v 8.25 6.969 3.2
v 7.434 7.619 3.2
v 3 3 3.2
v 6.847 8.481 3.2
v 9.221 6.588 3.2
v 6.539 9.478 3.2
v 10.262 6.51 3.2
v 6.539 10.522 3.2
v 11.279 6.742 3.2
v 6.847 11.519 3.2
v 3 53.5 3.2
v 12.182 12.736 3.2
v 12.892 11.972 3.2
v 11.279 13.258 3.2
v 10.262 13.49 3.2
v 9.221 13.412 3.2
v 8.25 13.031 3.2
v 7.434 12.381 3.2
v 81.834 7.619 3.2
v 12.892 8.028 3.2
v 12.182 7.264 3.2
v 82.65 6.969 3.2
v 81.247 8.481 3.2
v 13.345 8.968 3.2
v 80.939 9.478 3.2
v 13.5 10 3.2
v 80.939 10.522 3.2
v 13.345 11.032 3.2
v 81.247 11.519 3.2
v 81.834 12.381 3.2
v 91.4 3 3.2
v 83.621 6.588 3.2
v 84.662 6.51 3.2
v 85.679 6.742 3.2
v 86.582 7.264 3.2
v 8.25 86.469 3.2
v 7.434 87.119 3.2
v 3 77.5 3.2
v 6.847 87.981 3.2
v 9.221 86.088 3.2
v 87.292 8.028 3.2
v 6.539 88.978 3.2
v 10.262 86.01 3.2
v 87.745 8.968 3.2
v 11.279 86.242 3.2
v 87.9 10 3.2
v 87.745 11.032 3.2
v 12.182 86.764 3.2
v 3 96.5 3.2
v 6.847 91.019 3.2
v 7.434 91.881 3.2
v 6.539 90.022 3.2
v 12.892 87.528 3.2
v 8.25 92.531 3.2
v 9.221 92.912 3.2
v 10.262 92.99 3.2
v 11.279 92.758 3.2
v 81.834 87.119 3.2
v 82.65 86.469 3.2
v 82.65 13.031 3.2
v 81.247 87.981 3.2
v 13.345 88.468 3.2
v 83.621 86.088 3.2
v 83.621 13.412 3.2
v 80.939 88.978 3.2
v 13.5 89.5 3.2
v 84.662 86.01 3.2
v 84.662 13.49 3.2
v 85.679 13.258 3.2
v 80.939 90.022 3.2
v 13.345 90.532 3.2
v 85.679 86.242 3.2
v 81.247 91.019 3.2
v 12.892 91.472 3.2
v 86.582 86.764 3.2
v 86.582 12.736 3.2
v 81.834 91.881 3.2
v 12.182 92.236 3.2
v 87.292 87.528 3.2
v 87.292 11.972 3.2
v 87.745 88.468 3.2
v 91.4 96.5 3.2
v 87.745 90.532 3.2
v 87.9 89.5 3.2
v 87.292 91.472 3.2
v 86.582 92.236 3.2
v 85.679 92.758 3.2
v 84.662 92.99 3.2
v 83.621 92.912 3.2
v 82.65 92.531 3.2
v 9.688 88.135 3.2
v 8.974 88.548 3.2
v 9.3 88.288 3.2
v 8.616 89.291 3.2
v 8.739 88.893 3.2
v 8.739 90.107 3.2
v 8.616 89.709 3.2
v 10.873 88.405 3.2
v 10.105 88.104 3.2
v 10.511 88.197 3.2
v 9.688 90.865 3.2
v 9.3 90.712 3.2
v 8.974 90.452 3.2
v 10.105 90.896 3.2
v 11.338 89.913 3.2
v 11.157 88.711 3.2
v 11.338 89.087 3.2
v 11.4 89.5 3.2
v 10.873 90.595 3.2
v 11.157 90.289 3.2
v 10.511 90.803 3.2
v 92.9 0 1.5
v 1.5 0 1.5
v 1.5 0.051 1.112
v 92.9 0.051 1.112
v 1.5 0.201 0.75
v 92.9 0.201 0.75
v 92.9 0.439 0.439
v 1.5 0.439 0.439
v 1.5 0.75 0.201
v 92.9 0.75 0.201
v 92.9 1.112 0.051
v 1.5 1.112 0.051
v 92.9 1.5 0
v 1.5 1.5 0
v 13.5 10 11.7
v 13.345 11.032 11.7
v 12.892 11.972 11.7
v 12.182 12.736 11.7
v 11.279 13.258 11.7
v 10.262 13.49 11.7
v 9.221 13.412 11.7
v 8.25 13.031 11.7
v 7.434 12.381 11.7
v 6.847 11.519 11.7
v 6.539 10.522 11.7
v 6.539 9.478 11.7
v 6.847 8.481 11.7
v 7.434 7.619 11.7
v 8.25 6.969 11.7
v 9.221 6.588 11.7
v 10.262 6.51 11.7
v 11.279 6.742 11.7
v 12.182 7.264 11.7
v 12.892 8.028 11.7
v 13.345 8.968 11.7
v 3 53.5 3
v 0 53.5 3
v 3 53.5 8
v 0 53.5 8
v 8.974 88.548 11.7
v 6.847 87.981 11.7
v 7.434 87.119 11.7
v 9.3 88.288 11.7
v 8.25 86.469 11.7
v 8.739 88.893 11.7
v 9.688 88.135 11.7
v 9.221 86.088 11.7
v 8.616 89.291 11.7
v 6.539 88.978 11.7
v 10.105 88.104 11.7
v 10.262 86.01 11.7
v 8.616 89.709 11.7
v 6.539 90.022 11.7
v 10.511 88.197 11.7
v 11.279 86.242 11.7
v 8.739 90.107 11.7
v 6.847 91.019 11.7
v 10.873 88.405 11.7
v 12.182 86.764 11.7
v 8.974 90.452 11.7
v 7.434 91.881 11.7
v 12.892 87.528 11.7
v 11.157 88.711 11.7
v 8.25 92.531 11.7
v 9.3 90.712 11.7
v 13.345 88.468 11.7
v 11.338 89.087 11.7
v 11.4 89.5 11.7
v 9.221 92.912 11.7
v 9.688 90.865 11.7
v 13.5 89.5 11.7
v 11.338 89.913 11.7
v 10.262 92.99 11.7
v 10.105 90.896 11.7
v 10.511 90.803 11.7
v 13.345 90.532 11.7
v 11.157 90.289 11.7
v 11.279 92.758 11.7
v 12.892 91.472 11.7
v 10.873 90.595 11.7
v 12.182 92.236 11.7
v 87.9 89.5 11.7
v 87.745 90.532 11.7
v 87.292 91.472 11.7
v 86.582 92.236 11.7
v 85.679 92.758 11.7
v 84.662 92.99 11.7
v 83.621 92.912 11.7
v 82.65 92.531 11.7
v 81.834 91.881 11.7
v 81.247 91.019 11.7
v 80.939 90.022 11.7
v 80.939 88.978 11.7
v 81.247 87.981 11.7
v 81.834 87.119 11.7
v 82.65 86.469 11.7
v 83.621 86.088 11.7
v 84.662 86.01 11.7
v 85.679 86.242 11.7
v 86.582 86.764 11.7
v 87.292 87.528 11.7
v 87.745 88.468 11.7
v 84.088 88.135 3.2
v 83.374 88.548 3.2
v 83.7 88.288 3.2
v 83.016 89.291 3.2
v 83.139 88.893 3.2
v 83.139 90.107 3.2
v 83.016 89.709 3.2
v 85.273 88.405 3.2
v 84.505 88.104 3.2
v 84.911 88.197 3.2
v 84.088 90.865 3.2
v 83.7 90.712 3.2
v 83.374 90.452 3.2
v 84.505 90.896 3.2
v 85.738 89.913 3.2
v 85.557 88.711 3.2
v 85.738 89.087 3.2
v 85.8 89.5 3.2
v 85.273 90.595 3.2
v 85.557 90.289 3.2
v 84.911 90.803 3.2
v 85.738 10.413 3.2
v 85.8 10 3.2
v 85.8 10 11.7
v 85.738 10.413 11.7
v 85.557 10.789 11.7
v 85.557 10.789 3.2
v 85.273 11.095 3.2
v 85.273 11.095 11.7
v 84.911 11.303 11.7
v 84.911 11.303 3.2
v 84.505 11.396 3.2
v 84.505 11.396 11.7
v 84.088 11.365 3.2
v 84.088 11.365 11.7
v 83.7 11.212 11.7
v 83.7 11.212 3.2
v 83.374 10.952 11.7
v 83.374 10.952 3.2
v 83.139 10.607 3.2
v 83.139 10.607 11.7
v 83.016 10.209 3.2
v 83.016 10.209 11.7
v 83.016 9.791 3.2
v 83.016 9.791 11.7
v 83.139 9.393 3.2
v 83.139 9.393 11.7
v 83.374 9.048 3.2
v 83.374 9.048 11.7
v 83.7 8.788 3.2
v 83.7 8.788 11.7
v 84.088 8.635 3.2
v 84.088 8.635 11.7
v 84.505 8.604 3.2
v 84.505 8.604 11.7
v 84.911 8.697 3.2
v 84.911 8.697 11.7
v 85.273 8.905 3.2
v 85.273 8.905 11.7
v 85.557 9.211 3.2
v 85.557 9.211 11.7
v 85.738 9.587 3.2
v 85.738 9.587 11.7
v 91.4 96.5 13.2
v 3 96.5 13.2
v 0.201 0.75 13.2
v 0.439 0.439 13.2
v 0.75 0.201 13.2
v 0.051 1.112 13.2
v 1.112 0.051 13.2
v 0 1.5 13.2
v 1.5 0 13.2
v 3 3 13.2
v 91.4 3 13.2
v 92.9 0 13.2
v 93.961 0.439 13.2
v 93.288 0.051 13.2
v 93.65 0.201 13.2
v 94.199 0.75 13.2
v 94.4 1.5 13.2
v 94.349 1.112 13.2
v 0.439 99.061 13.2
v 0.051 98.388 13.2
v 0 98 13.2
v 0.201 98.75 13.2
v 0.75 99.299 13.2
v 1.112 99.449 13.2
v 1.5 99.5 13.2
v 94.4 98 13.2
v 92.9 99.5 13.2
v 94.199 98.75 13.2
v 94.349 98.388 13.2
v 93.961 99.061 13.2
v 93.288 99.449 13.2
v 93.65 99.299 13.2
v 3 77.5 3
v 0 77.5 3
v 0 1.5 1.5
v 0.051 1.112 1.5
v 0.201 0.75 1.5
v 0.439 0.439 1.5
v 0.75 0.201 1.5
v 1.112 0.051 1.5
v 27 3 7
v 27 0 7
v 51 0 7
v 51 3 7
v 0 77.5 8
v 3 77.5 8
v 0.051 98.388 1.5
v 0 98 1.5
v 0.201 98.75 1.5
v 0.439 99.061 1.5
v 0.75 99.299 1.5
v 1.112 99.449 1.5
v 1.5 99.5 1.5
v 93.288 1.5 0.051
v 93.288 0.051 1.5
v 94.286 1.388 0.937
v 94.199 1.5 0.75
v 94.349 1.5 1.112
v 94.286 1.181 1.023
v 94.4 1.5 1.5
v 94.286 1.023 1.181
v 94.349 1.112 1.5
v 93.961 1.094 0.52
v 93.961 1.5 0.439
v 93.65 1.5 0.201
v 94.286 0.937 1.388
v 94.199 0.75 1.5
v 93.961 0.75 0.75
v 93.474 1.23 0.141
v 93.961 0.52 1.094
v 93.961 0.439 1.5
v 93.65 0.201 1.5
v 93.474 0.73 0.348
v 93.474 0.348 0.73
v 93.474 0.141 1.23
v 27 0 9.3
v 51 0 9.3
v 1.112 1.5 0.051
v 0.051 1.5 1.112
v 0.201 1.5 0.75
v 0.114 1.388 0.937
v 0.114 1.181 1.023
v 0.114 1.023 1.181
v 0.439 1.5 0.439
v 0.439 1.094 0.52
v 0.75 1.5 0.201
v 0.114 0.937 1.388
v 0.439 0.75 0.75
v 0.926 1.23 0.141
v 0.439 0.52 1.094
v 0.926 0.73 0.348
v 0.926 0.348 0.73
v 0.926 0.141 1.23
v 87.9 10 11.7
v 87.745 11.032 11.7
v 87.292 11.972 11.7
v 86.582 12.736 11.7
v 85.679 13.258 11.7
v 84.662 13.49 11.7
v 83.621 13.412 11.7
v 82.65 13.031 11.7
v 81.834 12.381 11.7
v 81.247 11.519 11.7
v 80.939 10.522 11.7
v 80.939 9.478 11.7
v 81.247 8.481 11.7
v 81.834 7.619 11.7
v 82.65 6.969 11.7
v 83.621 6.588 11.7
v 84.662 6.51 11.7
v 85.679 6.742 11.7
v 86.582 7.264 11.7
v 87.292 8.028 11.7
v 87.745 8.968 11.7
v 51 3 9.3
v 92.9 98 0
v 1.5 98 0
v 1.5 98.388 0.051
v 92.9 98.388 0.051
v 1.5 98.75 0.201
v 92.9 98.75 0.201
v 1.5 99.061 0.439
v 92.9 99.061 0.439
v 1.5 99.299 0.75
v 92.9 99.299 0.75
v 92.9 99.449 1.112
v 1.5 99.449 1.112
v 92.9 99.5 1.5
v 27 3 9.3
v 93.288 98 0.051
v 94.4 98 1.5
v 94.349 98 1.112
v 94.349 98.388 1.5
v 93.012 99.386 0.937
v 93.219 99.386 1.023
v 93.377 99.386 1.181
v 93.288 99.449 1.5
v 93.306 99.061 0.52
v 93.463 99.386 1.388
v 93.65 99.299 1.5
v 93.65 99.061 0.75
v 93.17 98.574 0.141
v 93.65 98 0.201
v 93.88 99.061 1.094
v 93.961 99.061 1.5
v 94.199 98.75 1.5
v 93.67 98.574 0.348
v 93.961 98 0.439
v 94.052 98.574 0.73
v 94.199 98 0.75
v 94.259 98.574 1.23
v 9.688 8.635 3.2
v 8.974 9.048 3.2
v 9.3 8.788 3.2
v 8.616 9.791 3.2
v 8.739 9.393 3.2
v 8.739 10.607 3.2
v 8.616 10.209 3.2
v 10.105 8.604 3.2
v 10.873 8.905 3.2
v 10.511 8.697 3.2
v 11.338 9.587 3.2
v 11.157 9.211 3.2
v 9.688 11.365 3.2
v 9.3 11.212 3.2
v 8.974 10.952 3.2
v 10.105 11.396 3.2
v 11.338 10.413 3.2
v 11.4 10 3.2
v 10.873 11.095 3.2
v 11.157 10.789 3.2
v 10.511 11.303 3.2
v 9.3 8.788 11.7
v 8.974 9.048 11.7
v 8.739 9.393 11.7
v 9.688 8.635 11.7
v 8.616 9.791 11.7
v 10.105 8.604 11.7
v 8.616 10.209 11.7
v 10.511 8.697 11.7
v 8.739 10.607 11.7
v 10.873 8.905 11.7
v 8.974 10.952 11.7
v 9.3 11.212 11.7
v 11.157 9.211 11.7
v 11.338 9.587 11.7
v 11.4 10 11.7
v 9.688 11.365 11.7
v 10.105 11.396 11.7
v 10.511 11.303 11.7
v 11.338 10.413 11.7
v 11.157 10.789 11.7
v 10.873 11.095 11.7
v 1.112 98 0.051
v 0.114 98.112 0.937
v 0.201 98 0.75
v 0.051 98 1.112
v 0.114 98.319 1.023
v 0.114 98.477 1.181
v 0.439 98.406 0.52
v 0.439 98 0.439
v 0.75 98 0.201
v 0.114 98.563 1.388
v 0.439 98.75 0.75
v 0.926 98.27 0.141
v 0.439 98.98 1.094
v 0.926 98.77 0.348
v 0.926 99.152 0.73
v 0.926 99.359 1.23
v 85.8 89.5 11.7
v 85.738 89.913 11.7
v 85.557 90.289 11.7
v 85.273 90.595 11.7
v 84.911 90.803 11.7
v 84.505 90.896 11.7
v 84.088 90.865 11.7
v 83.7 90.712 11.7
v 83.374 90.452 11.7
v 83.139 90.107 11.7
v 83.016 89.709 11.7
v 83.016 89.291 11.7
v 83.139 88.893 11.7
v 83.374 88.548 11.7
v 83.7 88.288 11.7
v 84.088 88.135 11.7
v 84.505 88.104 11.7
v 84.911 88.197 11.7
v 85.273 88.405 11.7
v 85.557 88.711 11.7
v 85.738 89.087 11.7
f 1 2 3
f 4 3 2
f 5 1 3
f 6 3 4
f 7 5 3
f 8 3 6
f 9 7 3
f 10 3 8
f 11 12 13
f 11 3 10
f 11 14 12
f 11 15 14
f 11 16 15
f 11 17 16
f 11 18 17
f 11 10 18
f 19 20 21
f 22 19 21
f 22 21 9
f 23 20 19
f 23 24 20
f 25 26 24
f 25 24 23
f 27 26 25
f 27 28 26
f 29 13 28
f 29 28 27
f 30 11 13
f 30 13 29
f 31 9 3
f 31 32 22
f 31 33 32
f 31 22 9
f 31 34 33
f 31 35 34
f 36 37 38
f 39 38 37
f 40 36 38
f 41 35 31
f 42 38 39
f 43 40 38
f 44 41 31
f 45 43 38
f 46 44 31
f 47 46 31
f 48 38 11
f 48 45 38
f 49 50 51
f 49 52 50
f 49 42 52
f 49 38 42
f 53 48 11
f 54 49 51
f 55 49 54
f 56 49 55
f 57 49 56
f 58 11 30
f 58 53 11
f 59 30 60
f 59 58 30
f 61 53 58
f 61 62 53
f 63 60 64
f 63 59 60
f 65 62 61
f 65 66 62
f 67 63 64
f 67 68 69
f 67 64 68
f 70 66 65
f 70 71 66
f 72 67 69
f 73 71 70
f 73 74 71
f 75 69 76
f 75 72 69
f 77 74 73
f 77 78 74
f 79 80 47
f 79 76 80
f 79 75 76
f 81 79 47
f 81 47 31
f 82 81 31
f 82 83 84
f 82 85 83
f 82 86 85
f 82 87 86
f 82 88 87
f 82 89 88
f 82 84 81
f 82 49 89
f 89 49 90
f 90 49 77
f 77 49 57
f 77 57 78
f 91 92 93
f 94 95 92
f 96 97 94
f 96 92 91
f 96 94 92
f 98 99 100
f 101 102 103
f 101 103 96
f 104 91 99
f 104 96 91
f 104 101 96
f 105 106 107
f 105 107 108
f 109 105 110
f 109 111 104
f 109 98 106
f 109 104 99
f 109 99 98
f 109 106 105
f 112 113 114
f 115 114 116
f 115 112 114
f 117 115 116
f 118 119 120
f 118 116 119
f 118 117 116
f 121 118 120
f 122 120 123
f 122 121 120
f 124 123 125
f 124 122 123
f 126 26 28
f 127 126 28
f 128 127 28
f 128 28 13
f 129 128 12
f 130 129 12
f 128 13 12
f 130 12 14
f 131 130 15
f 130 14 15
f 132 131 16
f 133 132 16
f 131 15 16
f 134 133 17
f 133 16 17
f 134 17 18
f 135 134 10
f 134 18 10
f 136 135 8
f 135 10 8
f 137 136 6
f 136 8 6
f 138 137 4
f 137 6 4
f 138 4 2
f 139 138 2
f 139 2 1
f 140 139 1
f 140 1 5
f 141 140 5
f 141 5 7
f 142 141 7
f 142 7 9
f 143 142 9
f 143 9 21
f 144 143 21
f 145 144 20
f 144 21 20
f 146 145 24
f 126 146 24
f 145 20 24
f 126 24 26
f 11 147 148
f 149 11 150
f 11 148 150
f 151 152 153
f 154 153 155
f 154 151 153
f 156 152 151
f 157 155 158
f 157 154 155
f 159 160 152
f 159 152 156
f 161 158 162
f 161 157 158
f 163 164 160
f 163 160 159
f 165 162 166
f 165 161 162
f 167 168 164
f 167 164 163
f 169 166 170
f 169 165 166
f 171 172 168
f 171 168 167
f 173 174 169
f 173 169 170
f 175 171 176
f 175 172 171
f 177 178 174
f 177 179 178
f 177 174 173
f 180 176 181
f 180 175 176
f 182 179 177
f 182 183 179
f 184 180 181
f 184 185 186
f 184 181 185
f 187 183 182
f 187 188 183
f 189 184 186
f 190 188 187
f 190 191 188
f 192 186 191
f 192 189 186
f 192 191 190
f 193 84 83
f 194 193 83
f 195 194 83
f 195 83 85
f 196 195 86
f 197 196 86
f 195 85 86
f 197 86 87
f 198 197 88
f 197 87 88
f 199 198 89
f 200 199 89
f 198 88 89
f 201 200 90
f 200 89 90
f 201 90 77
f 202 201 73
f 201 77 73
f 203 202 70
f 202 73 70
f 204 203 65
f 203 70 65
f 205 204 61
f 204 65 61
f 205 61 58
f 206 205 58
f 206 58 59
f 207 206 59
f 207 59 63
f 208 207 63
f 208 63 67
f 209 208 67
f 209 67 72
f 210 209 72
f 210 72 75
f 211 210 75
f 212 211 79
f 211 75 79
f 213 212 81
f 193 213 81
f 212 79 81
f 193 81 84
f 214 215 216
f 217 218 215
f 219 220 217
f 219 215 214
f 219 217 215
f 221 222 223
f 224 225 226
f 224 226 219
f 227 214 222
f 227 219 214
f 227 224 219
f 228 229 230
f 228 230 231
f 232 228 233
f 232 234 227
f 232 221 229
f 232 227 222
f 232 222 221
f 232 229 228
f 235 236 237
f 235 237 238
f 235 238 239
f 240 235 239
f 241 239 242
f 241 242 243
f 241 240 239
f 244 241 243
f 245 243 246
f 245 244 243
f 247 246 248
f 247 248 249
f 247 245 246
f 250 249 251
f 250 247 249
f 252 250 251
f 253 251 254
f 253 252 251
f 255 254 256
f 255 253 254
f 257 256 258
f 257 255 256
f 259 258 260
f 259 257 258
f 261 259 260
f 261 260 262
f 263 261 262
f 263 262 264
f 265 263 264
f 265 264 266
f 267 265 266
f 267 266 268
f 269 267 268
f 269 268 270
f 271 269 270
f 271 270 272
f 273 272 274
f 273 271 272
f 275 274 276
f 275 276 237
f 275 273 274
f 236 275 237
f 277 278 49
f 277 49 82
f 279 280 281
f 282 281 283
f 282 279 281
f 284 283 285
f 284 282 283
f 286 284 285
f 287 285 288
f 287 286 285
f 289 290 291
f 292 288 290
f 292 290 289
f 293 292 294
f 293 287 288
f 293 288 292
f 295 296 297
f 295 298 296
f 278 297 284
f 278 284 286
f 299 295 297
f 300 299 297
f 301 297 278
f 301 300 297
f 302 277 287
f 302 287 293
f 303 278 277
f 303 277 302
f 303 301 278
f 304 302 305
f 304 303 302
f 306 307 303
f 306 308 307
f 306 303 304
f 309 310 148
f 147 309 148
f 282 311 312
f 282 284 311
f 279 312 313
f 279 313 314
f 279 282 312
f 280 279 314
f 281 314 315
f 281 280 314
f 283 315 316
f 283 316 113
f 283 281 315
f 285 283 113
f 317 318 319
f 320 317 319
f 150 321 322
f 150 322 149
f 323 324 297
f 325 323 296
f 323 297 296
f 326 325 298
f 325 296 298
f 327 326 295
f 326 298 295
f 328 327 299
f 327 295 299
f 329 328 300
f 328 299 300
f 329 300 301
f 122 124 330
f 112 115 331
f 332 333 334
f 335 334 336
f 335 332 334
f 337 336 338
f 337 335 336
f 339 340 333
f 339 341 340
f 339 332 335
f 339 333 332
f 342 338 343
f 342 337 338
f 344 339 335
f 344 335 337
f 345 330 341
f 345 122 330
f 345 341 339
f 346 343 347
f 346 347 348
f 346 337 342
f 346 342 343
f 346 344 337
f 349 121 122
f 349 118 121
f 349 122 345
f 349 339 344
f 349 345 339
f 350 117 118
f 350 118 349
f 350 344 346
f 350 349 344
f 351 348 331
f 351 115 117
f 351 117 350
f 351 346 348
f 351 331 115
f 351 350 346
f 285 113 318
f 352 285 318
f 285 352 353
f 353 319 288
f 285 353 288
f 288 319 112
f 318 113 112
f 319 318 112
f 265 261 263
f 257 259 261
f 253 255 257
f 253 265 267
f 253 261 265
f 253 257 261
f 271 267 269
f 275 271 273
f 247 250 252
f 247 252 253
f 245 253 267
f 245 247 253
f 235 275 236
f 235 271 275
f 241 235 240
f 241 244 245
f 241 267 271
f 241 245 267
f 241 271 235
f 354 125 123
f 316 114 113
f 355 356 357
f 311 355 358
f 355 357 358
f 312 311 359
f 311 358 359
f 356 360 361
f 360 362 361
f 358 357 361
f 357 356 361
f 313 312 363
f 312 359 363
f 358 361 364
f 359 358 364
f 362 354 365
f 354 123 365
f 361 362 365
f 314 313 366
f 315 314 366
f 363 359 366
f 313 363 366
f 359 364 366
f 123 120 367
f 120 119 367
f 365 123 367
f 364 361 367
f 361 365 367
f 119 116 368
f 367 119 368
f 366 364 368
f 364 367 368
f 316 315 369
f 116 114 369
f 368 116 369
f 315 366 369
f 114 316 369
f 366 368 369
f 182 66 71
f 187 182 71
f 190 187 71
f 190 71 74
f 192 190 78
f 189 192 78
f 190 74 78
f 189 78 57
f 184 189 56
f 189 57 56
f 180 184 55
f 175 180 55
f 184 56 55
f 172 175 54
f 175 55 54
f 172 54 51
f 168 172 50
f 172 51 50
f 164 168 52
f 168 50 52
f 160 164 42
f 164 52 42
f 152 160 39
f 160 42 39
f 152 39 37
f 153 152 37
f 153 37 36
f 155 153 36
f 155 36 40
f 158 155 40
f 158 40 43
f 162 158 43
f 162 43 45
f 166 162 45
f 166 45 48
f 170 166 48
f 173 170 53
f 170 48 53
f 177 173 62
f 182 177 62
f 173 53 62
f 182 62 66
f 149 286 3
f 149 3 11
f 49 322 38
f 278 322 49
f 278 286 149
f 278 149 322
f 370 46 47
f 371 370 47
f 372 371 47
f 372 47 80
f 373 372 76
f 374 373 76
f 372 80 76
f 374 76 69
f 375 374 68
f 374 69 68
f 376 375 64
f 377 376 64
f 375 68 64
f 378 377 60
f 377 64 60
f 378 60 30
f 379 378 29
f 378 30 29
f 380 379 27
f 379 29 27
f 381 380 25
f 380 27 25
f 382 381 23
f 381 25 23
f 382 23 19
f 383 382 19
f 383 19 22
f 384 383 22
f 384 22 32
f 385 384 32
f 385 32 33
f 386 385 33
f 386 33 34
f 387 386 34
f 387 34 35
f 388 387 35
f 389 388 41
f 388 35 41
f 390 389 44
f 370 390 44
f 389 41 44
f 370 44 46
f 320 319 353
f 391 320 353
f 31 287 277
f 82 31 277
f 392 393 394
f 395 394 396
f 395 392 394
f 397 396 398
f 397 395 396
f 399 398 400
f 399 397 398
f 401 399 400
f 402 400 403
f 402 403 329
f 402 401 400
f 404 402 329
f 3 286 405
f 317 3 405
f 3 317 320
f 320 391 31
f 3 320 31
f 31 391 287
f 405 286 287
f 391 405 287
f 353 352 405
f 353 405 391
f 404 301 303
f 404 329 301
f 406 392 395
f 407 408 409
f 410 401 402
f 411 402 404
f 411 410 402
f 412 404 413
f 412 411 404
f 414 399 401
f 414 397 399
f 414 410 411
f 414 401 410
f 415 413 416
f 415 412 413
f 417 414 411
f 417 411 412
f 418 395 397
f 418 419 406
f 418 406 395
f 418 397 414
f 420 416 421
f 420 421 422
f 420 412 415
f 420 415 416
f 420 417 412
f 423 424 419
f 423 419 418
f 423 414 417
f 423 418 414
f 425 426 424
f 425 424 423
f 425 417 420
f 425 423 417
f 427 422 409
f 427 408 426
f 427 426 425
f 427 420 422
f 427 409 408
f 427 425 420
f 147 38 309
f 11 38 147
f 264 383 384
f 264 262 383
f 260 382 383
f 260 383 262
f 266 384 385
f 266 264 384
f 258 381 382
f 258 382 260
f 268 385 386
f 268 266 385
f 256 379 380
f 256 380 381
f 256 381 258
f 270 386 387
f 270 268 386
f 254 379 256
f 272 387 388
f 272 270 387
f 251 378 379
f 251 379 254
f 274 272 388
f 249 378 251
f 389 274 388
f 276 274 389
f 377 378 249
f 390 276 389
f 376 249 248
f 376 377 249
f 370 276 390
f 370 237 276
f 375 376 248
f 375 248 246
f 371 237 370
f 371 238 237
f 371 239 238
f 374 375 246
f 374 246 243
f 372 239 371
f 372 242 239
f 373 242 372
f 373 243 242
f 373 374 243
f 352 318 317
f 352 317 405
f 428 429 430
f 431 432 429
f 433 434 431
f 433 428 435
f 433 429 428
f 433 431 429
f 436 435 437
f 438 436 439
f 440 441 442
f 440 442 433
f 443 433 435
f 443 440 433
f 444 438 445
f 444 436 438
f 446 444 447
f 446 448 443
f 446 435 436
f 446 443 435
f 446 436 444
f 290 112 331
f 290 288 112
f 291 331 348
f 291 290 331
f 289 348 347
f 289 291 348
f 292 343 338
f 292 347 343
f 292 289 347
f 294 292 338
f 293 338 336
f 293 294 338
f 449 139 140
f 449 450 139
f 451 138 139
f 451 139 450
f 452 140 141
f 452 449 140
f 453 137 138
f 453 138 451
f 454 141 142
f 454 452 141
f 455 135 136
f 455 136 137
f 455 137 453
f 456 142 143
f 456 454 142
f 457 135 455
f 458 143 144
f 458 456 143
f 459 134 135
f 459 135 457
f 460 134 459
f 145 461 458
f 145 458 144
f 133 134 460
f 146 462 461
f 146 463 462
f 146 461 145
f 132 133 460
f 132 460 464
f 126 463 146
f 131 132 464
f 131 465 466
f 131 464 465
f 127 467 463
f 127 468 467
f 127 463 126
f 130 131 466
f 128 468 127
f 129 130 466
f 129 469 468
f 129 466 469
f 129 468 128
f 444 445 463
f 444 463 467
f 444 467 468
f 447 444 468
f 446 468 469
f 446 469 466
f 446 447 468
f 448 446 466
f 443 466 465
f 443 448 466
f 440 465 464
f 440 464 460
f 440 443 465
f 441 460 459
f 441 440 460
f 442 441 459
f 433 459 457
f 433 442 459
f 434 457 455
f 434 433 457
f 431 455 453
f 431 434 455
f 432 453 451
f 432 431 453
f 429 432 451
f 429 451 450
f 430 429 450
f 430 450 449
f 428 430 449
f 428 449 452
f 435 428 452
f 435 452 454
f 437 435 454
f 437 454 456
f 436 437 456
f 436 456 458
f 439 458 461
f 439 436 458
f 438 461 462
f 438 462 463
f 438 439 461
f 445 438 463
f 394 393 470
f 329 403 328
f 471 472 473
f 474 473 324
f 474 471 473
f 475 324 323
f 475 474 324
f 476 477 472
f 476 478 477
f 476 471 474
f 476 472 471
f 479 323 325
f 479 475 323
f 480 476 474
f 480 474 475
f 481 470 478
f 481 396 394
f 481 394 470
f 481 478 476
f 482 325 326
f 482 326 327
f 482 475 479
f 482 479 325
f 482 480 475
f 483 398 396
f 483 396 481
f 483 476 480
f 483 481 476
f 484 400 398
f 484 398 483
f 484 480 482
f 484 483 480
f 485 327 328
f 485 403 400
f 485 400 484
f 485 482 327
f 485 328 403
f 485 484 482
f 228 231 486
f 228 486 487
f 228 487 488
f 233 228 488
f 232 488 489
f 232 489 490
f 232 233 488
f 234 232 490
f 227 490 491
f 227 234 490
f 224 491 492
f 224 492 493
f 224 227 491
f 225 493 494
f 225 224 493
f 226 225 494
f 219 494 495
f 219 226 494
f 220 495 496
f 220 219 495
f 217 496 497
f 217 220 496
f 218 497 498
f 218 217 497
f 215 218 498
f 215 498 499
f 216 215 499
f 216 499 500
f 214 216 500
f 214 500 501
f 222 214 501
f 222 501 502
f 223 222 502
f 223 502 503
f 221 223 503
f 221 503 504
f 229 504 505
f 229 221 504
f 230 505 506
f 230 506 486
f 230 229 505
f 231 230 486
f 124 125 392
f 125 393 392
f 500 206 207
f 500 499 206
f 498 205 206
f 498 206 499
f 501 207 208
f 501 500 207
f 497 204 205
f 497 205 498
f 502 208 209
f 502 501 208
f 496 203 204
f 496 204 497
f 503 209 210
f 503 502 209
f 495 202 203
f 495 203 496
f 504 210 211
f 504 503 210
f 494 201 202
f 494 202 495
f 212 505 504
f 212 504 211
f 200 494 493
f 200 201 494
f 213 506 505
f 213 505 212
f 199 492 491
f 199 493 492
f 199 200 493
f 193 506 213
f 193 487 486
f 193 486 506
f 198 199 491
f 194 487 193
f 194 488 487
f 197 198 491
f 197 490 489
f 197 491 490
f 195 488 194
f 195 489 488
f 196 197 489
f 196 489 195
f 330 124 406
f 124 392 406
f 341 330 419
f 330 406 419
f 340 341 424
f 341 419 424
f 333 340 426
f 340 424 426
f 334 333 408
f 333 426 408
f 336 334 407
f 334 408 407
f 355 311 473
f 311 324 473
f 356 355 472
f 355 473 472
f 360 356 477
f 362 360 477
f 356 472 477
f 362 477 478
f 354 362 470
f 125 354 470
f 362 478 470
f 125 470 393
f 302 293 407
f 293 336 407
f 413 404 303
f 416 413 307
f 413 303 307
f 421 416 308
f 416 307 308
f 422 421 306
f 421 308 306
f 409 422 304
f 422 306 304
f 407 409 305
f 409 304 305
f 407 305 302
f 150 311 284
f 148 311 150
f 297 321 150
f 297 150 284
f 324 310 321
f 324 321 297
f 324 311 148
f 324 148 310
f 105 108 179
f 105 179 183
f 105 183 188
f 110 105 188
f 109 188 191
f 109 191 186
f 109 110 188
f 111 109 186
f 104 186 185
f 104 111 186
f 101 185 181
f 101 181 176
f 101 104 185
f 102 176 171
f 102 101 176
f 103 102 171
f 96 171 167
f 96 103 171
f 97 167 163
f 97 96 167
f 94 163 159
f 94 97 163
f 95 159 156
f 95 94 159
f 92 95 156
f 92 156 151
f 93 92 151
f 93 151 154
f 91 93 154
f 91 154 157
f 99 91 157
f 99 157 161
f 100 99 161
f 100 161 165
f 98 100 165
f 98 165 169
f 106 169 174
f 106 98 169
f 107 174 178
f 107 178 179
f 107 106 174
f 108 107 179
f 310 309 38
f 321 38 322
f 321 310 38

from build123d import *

# Parameters (mm, degrees)
SKETCH_W        = 94.4
SKETCH_H        = 99.5
PAD_DEPTH       = 13.2
SKETCH001_W     = 88.4
SKETCH001_H     = 93.5
POCKET_DEPTH    = 10
SKETCH002_R     = 3.5
SKETCH002_R_2   = 1.4
PAD001_DEPTH    = 8.5
SKETCH003_W     = 24
SKETCH003_H     = 2.3
POCKET001_DEPTH = 3
SKETCH004_W     = 24
SKETCH004_H     = 5
POCKET002_DEPTH = 3
FILLET_R        = 1.5


with BuildPart() as part:
    # Sketch → Pad (new body)
    with BuildSketch(Plane.XY):
        with Locations((47.2, 49.75)):
            Rectangle(SKETCH_W, SKETCH_H)
    extrude(amount=PAD_DEPTH)

    # Sketch001 (on Face6 of Pad) → Pocket (cut)
    with BuildSketch(Plane.XY.offset(13.2)):
        with Locations((47.2, 49.75)):
            Rectangle(SKETCH001_W, SKETCH001_H)
    extrude(amount=-POCKET_DEPTH, mode=Mode.SUBTRACT)

    # Sketch002 (on Face11 of Pocket) → Pad001 (join)
    with BuildSketch(Plane.XY.offset(3.2)):
        with Locations((84.4, 89.5)):
            Circle(SKETCH002_R)
        with Locations((84.4, 89.5)):
            Circle(SKETCH002_R_2, mode=Mode.SUBTRACT)
        with Locations((10, 89.5)):
            Circle(SKETCH002_R)
        with Locations((10, 89.5)):
            Circle(SKETCH002_R_2, mode=Mode.SUBTRACT)
        with Locations((10, 10)):
            Circle(SKETCH002_R)
        with Locations((10, 10)):
            Circle(SKETCH002_R_2, mode=Mode.SUBTRACT)
        with Locations((84.4, 10)):
            Circle(SKETCH002_R)
        with Locations((84.4, 10)):
            Circle(SKETCH002_R_2, mode=Mode.SUBTRACT)
    extrude(amount=PAD001_DEPTH)

    # Sketch003 (on Face1 of Pad001) → Pocket001 (cut)
    with BuildSketch(Plane.XZ):
        with Locations((39, 8.15)):
            Rectangle(SKETCH003_W, SKETCH003_H)
    extrude(amount=-POCKET001_DEPTH, mode=Mode.SUBTRACT)

    # Sketch004 (on Face2 of Pocket001) → Pocket002 (cut)
    with BuildSketch(Plane(origin=(0, 0, 0), x_dir=(0, -1, 0), z_dir=(-1, 0, 0))):
        with Locations((-65.5, 5.5)):
            Rectangle(SKETCH004_W, SKETCH004_H)
    extrude(amount=-POCKET002_DEPTH, mode=Mode.SUBTRACT)

    # Fillet
    fillet_edges = [part.edges().sort_by_distance(p)[0] for p in [
        (47.2, 0, 0),
        (94.4, 49.75, 0),
        (47.2, 99.5, 0),
        (0, 49.75, 0),
        (94.4, 0, 6.6),
        (0, 0, 6.6),
        (94.4, 99.5, 6.6),
        (0, 99.5, 6.6),
    ]]
    fillet(fillet_edges, radius=FILLET_R)


solid = part.part
